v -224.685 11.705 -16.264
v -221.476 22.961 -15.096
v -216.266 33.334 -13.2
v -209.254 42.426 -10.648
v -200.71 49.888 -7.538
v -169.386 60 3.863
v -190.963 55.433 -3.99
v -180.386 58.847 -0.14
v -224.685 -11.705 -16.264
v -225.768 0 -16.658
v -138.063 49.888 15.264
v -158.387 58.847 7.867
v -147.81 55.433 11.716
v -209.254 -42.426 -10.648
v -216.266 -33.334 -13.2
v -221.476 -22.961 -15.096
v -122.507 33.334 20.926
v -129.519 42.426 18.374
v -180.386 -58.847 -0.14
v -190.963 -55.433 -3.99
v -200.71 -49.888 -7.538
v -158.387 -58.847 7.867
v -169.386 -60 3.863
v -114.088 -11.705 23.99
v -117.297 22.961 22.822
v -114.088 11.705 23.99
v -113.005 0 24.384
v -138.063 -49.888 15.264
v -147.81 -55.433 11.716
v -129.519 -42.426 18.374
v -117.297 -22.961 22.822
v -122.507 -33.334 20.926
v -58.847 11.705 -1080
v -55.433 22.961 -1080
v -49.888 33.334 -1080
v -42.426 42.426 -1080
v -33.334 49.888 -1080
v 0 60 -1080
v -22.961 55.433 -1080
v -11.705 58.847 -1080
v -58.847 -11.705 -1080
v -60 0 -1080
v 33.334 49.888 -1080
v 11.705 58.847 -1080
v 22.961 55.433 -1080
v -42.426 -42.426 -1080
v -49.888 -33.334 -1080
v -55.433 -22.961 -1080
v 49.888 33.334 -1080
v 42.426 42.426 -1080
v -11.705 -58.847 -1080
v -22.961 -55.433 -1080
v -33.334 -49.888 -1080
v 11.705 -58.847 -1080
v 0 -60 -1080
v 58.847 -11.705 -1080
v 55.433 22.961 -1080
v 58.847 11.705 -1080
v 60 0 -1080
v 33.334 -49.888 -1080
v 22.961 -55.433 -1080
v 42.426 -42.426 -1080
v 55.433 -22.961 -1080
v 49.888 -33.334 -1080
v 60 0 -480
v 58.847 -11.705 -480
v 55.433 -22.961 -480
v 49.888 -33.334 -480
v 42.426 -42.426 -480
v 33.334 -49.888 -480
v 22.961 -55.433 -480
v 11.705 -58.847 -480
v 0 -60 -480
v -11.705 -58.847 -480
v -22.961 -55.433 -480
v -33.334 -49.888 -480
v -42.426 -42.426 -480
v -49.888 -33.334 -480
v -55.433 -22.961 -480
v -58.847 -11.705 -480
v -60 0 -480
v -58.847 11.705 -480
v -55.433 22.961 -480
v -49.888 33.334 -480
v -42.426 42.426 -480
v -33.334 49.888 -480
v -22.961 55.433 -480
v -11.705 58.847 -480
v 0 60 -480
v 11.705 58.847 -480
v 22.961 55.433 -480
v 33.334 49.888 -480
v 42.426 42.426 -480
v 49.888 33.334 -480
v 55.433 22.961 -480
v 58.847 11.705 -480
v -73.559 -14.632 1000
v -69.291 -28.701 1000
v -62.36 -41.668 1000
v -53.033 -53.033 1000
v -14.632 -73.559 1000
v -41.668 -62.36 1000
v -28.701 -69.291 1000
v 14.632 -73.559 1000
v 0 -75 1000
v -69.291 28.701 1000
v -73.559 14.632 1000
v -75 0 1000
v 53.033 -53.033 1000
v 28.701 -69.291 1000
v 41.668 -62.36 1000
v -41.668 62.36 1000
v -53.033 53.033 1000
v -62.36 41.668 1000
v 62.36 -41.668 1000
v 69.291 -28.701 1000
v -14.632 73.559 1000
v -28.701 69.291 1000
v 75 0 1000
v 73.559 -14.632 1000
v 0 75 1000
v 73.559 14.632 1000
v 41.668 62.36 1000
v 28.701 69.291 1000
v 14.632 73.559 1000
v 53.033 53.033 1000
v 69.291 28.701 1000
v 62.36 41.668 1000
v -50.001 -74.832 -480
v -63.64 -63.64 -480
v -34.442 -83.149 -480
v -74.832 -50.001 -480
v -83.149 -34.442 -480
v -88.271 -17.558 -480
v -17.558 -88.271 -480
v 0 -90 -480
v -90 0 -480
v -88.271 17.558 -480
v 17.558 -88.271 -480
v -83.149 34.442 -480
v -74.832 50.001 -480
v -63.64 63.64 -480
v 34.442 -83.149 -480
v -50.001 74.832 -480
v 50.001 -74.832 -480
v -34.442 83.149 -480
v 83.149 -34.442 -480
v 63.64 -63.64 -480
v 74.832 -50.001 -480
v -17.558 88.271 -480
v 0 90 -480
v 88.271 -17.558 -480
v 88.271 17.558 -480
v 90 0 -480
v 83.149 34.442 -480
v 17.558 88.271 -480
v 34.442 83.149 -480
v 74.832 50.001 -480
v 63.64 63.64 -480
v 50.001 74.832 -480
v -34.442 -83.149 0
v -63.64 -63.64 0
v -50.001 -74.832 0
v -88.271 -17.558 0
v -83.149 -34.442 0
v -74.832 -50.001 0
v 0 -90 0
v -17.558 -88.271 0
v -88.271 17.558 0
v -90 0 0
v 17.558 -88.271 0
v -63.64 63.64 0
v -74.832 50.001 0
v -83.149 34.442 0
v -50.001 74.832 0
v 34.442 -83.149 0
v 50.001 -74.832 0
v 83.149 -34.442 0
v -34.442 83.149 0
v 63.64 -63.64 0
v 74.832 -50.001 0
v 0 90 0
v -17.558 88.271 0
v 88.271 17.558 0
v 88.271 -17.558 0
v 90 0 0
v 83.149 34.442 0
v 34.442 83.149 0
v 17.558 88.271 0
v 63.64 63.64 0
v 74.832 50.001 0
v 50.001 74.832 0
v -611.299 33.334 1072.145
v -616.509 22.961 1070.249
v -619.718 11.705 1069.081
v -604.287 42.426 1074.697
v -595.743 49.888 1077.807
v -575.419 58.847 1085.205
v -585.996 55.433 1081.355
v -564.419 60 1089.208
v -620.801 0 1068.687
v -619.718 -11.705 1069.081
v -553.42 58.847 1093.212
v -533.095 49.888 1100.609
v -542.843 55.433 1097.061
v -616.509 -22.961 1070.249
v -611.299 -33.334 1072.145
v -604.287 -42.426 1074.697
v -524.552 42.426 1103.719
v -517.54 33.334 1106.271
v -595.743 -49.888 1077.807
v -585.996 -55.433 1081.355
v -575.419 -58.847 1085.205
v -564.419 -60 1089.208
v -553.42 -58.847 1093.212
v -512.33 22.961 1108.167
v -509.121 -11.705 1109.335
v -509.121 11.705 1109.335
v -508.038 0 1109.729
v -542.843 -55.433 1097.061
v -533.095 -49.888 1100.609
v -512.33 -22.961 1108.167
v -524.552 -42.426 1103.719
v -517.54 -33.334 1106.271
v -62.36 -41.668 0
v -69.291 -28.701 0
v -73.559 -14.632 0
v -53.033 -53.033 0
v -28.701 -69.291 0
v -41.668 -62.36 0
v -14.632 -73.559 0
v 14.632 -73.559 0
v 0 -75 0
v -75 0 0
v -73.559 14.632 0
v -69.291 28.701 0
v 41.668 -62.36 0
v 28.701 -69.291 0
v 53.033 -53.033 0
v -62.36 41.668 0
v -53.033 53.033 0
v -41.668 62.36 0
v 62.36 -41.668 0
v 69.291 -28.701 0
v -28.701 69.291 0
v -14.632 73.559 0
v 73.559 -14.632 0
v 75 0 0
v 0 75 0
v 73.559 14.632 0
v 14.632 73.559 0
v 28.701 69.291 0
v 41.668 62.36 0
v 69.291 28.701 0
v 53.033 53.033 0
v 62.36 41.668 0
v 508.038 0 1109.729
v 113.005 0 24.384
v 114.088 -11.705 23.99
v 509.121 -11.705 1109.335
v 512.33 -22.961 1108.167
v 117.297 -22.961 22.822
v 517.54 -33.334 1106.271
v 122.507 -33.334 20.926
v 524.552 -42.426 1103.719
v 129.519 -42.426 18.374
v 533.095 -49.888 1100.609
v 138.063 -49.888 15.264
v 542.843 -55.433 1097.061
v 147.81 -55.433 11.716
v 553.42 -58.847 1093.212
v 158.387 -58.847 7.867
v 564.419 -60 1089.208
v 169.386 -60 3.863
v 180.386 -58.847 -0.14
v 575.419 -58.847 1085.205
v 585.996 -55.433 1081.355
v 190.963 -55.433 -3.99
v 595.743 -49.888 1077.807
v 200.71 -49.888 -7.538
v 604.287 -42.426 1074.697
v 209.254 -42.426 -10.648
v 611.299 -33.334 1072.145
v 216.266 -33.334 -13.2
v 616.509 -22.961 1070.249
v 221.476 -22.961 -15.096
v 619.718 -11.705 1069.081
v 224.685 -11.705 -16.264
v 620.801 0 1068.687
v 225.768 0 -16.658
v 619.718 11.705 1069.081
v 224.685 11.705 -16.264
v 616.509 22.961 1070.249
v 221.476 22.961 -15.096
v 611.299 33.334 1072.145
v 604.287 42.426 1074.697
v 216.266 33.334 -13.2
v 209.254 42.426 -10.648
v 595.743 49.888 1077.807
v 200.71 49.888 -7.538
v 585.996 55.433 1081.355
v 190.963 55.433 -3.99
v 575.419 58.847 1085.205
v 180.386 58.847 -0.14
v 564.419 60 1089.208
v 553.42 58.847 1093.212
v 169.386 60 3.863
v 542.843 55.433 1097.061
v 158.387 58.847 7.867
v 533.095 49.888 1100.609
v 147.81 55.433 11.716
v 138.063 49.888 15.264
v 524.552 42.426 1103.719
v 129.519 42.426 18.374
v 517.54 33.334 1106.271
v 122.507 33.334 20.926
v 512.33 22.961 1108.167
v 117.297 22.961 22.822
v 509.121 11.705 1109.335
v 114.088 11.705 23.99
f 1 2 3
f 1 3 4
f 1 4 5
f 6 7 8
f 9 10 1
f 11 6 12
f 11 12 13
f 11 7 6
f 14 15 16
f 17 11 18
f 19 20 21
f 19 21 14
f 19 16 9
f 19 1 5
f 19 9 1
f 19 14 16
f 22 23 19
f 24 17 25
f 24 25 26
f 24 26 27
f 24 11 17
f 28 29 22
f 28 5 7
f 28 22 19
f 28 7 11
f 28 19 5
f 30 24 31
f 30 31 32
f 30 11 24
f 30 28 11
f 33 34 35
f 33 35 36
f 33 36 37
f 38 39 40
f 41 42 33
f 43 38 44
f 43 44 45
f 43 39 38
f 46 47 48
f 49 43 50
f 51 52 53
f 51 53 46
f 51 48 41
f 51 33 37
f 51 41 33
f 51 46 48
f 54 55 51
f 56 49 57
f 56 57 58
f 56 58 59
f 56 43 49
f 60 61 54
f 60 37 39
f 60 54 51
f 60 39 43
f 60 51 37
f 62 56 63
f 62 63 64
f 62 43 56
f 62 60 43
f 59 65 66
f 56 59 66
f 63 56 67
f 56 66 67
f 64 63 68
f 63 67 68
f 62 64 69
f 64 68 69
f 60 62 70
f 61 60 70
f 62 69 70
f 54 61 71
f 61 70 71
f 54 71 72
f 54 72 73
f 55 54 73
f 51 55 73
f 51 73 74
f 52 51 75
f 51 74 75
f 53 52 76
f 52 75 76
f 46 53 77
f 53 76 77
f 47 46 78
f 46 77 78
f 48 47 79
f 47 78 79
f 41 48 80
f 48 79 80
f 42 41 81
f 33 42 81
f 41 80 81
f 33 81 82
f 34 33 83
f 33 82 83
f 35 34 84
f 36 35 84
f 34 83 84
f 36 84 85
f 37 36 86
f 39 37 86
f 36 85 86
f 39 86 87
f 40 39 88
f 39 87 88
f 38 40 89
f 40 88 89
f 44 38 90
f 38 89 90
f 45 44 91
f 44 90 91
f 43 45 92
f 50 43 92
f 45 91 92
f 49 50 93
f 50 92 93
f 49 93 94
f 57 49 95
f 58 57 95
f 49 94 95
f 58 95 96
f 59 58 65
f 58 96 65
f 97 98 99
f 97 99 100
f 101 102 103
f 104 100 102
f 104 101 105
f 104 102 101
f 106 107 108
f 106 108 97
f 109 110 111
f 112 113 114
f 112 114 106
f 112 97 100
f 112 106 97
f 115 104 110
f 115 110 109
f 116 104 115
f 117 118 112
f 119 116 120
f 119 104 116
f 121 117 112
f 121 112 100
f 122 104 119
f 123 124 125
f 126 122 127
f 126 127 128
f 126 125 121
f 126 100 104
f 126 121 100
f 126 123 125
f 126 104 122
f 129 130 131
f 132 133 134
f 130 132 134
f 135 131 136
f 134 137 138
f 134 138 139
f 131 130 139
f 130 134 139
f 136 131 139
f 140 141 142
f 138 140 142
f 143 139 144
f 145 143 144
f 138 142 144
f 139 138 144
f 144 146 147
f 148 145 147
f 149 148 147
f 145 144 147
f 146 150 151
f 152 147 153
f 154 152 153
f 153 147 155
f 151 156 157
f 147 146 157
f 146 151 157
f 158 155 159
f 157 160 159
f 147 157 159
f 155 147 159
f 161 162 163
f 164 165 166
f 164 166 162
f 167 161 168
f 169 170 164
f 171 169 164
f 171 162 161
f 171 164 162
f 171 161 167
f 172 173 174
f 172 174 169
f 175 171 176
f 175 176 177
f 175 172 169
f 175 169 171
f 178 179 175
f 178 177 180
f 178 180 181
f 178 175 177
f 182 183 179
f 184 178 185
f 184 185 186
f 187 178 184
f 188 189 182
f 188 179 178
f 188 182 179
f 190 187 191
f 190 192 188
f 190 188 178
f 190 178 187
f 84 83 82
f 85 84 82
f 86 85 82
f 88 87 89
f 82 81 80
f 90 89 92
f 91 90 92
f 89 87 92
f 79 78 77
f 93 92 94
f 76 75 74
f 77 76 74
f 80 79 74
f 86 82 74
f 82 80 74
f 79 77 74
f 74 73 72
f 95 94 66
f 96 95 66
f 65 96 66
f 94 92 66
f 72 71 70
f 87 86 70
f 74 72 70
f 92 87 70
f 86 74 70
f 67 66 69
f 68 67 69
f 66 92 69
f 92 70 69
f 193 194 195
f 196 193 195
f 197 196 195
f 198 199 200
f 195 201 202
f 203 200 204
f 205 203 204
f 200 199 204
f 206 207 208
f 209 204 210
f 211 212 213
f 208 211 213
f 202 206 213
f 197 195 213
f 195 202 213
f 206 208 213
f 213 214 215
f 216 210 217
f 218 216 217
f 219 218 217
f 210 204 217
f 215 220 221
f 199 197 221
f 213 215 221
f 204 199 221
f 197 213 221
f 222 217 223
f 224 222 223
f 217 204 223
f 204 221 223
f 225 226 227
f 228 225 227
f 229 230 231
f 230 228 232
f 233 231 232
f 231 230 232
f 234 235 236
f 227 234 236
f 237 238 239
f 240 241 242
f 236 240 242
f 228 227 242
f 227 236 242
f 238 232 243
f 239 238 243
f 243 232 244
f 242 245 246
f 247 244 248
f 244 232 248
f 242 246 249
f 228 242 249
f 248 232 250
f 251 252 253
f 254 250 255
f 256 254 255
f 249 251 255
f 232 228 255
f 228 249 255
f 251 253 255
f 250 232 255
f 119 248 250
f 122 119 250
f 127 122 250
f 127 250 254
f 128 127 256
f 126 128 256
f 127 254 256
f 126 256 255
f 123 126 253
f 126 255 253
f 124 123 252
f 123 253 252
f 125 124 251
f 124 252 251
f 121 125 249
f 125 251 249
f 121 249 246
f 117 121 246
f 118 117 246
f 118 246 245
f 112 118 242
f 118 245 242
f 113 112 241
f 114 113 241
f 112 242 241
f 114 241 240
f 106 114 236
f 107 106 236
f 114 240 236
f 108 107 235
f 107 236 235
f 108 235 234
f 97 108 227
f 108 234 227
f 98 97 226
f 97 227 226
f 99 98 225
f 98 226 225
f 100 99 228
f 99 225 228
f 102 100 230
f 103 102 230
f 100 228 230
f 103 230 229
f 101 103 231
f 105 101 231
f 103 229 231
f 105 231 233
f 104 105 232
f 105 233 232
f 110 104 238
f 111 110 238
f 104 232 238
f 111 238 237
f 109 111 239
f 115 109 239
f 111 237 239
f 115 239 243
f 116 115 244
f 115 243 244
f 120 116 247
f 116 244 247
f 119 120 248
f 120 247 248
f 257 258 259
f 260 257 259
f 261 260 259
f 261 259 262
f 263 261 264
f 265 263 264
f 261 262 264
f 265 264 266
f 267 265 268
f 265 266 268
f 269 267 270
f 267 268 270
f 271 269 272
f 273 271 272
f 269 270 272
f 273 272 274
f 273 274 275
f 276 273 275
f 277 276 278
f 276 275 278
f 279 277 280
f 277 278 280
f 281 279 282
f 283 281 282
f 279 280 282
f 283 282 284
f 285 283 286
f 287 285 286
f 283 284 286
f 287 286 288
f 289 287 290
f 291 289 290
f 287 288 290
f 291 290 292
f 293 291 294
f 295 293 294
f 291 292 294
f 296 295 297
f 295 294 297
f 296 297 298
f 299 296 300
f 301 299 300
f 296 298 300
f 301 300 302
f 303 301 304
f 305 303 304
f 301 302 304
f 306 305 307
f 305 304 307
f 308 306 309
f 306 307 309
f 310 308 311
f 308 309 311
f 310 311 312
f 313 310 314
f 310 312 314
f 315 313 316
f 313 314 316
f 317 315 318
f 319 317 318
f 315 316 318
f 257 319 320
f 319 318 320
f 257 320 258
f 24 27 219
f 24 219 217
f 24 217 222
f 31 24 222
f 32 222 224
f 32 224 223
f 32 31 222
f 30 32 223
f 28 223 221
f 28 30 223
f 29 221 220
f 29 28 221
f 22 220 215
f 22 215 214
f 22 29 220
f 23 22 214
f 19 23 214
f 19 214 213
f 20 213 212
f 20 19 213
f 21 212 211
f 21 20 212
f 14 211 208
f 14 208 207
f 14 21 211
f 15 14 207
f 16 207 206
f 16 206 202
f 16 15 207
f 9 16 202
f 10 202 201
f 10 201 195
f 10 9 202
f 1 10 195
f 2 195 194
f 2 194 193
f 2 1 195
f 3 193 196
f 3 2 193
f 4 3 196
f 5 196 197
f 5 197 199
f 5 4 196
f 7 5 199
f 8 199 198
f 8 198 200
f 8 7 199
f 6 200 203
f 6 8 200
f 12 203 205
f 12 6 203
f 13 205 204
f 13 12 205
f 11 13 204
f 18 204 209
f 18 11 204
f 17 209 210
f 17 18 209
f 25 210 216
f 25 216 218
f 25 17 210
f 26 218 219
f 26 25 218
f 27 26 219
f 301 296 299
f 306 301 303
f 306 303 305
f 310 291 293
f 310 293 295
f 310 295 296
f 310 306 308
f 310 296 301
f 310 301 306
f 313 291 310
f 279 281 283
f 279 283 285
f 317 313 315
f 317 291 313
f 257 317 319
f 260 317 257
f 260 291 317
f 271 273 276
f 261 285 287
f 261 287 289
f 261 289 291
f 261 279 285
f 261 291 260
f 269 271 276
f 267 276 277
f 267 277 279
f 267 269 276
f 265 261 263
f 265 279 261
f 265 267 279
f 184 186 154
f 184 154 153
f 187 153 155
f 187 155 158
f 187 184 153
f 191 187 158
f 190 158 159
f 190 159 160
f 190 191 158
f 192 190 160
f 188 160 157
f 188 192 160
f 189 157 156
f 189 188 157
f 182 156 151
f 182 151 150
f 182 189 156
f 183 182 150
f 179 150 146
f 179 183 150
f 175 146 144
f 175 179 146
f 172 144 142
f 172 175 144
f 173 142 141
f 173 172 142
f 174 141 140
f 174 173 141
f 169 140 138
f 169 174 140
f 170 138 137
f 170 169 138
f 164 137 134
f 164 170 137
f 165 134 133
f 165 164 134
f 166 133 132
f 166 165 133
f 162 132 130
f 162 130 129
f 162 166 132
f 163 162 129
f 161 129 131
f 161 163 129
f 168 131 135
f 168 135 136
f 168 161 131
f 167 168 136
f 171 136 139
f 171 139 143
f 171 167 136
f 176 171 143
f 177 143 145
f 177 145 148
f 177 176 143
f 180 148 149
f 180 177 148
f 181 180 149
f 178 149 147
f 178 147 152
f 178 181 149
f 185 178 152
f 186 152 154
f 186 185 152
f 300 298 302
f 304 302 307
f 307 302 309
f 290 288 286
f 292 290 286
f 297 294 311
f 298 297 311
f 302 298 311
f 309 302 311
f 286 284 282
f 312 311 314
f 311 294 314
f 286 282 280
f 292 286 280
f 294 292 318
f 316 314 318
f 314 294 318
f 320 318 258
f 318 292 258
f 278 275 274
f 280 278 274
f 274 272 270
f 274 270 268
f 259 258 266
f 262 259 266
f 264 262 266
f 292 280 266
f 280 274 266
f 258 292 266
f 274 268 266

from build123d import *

# Parameters (mm, degrees)
F0_R     = 75
F1_DEPTH = 1000
F0_R_2   = 90
F2_DEPTH = 480
F5_R     = 60
F6_DEPTH = 1155
F8_R     = 60
F9_DEPTH = 600


with BuildPart() as f1:
    # F0 (on Top) → F1 (new body)
    with BuildSketch(Plane.XY):
        Circle(F0_R)
    extrude(amount=F1_DEPTH)


with BuildPart() as f2:
    # F0 (on Top) → F2 (new body)
    with BuildSketch(Plane.XY):
        Circle(F0_R_2)
        Circle(F0_R, mode=Mode.SUBTRACT)
        Circle(F0_R)
    extrude(amount=-F2_DEPTH)


with BuildPart() as f6:
    # F5 (on face) → F6 (new body)
    with BuildSketch(Plane(origin=(-21.056, 0, 57.850885), x_dir=(0.939693, 0, 0.34202), z_dir=(0.34202, 0, -0.939693))):
        with Locations((-157.849923, 0)):
            Circle(F5_R)
    extrude(amount=-F6_DEPTH)


with BuildPart() as f7_1:
    # F7: instance of F6
    add(f6.part.mirror(Plane.YZ))


with BuildPart() as f9:
    # F8 (on face) → F9 (new body)
    with BuildSketch(Plane(origin=(0, 0, -480), x_dir=(1, 0, 0), z_dir=(0, 0, -1))):
        Circle(F8_R)
    extrude(amount=F9_DEPTH)


solid = Compound([f1.part, f2.part, f6.part, f7_1.part, f9.part])
